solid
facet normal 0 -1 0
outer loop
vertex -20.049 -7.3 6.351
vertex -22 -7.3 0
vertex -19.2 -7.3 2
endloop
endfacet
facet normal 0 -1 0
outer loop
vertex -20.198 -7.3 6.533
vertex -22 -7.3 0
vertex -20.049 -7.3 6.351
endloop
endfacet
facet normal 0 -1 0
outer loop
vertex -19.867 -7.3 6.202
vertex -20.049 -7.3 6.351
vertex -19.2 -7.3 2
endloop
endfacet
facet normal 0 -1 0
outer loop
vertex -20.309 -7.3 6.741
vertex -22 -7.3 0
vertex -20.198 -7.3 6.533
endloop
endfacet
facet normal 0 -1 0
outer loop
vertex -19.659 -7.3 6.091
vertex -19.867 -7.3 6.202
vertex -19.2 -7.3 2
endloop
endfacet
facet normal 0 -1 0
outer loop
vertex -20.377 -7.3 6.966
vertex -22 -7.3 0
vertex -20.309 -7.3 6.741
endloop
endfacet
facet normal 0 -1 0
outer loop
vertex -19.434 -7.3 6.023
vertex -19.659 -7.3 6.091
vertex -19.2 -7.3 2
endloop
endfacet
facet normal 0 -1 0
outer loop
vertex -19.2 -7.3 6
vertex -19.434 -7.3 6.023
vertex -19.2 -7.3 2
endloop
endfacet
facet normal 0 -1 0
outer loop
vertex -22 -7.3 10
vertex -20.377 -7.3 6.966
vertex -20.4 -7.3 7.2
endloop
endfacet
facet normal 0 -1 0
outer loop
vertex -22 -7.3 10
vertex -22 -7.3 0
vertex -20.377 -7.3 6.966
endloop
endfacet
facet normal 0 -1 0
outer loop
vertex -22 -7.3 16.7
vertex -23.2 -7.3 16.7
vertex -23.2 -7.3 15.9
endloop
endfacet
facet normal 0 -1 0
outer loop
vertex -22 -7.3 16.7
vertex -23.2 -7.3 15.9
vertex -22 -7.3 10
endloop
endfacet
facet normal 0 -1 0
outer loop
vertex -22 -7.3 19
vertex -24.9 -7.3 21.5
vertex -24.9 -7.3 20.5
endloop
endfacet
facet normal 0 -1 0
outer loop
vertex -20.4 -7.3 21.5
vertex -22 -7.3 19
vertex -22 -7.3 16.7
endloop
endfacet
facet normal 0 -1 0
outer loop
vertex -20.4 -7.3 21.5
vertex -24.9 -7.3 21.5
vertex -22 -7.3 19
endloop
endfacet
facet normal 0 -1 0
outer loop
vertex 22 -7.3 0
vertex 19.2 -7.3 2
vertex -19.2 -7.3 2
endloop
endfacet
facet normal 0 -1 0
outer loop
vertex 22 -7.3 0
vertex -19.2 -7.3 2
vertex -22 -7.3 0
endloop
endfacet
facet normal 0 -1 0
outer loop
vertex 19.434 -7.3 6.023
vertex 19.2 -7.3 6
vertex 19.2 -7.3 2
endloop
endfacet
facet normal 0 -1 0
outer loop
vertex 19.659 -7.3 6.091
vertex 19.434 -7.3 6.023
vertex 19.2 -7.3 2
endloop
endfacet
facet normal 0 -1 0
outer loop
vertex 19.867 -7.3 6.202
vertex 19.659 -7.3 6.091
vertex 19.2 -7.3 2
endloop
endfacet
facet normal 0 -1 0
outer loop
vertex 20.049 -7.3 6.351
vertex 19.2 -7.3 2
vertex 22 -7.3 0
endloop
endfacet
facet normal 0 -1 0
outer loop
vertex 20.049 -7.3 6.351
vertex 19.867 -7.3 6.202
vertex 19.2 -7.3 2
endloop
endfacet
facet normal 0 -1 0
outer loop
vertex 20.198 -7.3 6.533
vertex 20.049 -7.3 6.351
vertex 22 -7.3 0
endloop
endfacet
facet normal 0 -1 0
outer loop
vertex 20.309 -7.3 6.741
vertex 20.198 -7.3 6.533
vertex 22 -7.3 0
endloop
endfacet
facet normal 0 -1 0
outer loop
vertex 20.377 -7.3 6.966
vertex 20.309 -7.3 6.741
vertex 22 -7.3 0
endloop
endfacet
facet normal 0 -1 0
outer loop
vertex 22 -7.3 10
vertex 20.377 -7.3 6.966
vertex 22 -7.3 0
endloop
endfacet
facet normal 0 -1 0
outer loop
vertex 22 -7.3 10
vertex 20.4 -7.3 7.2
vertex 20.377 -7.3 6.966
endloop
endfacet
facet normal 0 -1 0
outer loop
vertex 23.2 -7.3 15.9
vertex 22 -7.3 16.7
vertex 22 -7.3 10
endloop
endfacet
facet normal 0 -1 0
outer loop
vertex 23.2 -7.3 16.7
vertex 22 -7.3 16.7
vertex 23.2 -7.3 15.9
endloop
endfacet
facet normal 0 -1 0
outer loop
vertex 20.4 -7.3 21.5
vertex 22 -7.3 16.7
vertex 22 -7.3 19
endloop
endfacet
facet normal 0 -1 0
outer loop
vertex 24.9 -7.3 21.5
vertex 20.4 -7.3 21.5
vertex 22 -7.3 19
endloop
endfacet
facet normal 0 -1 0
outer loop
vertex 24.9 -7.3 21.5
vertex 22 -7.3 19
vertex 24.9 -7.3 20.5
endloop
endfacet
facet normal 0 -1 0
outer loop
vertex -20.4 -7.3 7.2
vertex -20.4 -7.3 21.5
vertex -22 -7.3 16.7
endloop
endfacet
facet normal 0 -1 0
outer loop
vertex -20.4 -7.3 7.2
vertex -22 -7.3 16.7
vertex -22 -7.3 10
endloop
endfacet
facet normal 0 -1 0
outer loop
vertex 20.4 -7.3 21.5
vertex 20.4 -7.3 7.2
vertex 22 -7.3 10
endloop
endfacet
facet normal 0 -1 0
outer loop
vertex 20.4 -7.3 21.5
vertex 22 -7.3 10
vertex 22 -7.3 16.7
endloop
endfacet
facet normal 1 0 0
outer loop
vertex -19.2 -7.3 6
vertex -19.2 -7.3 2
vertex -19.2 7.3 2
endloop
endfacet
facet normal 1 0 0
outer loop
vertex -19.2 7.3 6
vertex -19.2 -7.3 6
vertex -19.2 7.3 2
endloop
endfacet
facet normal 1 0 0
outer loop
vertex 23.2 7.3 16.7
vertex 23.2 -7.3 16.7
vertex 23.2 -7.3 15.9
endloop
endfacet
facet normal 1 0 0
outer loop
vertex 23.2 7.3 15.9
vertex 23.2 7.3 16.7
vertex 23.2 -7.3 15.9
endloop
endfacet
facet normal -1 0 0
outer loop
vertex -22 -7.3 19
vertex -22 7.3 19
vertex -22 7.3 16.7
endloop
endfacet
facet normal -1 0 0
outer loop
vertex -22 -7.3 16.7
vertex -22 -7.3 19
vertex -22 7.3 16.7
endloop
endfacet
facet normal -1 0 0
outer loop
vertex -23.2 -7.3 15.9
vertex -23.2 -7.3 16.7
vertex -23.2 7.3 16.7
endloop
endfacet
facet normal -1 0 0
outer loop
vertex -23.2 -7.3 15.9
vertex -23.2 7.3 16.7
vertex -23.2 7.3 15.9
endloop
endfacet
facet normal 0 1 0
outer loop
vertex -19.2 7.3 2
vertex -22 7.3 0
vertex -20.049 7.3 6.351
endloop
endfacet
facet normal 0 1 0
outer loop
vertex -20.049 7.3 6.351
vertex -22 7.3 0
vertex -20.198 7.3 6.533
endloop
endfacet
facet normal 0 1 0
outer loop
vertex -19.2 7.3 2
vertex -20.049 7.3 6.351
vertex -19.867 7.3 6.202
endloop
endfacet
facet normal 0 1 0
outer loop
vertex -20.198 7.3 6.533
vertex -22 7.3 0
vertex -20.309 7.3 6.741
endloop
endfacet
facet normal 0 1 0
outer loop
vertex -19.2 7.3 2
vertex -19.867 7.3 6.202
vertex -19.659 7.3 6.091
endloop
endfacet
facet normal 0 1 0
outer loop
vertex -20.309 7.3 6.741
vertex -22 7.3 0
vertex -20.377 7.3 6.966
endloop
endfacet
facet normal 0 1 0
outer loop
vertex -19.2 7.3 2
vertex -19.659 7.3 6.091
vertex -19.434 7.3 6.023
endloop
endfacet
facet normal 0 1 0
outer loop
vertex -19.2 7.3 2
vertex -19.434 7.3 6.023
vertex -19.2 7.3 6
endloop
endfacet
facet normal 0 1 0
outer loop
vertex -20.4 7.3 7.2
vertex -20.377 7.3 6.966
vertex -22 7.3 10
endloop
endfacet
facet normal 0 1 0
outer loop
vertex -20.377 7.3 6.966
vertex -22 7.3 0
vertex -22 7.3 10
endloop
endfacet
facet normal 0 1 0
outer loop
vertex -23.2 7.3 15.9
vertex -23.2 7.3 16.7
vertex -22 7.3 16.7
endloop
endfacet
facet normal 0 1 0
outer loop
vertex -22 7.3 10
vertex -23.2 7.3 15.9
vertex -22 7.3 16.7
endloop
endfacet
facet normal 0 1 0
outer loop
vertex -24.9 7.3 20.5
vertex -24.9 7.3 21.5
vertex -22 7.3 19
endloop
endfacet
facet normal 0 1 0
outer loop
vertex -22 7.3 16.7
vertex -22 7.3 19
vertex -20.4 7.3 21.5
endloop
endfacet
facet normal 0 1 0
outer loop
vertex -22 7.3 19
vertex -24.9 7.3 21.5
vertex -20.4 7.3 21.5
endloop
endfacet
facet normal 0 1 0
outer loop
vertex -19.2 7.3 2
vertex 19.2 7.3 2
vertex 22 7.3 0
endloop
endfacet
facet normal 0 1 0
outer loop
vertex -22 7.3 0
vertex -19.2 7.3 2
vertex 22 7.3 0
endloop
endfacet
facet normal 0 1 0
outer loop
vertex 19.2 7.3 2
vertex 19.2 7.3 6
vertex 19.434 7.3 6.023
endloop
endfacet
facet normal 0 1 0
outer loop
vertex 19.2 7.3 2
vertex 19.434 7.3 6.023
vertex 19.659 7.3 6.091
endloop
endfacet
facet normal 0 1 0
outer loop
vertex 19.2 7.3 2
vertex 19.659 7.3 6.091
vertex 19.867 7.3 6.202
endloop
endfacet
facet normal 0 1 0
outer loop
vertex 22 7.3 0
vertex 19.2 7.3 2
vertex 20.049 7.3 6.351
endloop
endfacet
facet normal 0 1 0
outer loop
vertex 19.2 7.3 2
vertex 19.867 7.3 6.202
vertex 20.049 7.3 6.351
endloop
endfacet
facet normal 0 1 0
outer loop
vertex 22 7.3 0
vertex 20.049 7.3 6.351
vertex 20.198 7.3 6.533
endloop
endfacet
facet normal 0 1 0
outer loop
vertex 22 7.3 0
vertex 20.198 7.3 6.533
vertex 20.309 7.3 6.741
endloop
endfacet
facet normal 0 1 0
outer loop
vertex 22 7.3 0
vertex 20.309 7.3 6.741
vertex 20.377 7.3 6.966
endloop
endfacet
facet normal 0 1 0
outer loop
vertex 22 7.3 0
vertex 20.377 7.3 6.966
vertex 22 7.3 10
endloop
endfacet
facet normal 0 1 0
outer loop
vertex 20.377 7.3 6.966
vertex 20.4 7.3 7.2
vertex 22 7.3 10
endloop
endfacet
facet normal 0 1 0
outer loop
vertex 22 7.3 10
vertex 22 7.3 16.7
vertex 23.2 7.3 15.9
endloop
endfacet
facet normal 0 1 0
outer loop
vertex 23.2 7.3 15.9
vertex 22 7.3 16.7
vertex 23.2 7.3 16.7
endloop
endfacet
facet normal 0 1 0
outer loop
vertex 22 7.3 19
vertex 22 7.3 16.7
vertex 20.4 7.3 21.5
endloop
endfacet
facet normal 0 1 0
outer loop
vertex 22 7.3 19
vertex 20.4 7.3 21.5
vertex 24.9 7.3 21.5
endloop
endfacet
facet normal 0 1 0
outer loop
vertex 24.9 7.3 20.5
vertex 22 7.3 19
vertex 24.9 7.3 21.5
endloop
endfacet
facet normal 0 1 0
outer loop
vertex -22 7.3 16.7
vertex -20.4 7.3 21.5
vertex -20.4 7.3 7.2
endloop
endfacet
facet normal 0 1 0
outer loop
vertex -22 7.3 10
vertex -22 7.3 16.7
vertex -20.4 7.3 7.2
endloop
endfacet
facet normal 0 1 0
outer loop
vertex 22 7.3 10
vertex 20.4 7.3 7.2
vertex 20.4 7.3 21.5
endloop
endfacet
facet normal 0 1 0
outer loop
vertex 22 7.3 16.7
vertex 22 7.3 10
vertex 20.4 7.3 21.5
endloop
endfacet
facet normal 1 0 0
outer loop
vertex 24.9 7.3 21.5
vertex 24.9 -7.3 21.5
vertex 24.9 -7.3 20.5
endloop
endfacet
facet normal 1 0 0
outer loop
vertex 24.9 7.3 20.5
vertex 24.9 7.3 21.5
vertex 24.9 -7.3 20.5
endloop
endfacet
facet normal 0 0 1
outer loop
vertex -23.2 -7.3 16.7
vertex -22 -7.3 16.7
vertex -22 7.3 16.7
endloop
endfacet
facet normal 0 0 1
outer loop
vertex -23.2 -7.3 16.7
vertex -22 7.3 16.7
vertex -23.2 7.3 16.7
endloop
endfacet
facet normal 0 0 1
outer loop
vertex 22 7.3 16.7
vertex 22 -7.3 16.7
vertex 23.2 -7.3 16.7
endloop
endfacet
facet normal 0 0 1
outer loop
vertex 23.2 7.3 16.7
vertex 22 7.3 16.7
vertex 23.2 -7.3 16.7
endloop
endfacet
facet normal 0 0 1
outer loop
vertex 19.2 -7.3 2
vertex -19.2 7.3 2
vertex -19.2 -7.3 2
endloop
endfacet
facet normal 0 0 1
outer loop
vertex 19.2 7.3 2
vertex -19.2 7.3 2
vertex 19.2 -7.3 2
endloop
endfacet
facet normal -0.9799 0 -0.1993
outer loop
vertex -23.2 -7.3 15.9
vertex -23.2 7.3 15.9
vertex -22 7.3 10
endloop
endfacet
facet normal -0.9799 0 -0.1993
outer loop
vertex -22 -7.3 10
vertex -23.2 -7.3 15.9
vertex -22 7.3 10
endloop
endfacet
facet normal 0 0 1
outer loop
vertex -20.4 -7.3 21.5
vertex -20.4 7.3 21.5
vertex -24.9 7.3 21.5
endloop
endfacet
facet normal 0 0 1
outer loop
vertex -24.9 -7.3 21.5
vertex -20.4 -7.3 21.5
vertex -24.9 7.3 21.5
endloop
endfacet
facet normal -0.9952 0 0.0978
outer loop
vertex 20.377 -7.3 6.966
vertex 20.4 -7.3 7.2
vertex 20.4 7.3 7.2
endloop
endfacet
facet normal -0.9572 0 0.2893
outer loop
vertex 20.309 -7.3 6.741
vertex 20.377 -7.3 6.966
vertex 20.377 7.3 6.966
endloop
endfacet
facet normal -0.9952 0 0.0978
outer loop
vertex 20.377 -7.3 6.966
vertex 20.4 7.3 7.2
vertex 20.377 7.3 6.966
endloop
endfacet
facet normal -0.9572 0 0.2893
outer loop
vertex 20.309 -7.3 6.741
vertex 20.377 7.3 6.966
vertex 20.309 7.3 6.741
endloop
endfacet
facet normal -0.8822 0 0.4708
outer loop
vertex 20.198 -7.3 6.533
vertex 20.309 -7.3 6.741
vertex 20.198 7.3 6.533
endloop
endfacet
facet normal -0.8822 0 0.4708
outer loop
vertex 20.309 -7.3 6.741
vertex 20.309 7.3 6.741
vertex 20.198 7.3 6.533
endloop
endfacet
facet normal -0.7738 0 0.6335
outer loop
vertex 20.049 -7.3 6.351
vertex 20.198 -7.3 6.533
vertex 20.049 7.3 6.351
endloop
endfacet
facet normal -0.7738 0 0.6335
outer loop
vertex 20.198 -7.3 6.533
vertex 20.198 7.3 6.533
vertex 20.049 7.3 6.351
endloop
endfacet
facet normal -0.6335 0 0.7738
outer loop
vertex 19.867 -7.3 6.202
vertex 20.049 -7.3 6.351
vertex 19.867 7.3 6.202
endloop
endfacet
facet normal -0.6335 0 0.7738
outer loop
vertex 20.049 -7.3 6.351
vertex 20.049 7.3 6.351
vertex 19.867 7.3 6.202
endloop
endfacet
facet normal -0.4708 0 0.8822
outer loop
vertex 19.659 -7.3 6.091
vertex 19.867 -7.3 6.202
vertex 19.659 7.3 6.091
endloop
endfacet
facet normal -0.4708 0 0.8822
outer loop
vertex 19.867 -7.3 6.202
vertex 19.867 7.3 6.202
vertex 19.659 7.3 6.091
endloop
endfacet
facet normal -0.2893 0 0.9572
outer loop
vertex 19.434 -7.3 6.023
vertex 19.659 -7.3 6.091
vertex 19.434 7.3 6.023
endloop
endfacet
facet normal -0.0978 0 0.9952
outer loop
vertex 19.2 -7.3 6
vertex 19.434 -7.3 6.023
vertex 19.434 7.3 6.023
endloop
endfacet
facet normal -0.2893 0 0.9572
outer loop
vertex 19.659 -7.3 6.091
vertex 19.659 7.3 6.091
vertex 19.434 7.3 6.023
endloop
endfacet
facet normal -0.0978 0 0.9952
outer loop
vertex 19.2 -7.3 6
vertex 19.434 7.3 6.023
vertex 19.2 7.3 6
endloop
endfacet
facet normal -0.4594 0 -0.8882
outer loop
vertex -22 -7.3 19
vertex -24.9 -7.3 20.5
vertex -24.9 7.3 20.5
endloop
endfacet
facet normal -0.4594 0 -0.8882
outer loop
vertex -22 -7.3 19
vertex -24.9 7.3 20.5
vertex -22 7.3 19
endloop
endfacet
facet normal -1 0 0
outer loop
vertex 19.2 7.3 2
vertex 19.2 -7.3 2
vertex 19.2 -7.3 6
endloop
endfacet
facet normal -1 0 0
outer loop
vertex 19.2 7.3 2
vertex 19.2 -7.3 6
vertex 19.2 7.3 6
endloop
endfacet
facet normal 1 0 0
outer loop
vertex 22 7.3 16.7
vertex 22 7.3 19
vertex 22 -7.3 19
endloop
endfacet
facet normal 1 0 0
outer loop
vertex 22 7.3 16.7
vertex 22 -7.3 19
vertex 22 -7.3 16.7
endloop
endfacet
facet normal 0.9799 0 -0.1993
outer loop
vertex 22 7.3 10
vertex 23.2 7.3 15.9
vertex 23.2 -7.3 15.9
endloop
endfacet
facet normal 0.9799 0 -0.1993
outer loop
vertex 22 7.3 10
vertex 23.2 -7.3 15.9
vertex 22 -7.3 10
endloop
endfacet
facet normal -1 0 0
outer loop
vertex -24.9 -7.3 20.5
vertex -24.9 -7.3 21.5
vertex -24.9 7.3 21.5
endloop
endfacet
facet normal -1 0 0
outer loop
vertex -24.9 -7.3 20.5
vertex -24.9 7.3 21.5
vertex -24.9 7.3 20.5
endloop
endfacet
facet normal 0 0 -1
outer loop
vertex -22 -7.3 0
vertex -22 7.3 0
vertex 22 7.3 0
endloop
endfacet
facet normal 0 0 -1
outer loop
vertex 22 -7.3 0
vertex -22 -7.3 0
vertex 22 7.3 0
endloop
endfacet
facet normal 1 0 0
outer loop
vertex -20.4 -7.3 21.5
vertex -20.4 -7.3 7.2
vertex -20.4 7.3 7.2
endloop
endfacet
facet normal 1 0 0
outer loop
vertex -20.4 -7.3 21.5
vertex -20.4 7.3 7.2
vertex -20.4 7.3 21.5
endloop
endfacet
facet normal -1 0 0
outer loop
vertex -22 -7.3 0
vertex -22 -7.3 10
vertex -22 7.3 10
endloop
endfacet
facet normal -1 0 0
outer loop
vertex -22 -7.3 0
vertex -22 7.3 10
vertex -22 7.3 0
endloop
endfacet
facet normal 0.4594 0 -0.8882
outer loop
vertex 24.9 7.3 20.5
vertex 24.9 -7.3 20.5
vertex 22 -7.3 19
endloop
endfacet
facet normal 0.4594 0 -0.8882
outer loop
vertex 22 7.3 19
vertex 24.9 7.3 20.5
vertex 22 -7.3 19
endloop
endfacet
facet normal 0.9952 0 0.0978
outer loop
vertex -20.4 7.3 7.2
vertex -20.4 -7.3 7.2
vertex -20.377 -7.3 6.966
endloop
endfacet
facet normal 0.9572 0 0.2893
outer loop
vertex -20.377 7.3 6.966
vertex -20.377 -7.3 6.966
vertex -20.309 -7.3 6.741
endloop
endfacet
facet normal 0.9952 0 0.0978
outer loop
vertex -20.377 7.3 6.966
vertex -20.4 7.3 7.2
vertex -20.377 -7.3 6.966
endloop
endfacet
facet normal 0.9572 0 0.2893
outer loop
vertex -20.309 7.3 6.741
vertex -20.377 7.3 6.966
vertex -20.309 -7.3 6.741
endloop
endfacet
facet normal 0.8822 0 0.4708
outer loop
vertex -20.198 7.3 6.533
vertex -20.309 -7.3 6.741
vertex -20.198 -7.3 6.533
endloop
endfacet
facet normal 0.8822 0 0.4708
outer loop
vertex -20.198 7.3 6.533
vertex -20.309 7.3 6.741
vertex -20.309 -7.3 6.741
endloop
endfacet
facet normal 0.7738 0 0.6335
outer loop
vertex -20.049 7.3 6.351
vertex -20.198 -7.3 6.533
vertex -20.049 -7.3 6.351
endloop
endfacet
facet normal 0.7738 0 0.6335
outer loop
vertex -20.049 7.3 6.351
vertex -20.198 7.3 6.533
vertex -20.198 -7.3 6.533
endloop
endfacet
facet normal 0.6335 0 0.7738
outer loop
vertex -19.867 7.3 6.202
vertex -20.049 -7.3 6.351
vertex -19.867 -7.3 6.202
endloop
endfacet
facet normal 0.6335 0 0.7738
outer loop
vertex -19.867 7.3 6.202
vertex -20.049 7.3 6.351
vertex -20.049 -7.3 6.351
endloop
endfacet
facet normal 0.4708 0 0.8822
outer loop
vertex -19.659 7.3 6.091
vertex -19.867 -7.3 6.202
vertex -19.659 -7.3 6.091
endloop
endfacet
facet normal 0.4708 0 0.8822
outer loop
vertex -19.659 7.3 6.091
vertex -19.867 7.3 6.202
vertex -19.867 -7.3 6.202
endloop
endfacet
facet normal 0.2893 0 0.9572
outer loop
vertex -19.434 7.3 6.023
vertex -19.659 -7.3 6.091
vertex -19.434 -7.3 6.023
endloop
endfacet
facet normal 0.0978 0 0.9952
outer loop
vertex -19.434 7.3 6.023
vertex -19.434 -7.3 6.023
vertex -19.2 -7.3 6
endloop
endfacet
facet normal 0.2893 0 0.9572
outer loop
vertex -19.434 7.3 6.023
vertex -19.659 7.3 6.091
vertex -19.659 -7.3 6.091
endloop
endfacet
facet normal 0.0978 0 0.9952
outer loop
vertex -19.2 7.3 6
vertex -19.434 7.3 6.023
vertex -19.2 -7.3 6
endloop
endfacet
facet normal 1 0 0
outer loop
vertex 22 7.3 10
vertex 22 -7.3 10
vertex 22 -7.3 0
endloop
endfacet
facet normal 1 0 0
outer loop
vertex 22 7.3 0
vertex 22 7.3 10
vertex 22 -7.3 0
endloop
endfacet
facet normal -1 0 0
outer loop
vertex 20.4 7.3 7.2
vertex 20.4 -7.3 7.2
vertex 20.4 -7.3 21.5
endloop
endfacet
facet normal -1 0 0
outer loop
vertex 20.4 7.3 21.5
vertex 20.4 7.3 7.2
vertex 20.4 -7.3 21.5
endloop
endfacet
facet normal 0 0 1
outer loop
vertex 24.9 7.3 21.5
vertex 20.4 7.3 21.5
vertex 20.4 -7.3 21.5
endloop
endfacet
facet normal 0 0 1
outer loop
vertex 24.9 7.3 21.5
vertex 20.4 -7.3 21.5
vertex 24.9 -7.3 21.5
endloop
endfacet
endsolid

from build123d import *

# Parameters (mm, degrees)
SKETCH_1_W             = 44
SKETCH_1_H             = 14.6
EXTRUDE_1_DEPTH        = 2
SKETCH_2_W             = 2.8
SKETCH_2_H             = 14.6
EXTRUDE_2_DEPTH        = 4
EXTRUDE_3_DEPTH        = 14.6
FILLET_1_R             = 1.2
FILLET_1_OF_MIRROR_1_R = 1.2


with BuildPart() as part:
    # 草图1 → 凸台-拉伸1 (new body)
    with BuildSketch(Plane.XY):
        Rectangle(SKETCH_1_W, SKETCH_1_H)
    extrude(amount=EXTRUDE_1_DEPTH)

    # 草图2 → 凸台-拉伸2 (add)
    with BuildSketch(Plane.XY.offset(2)):
        with Locations((20.6, 0)):
            Rectangle(SKETCH_2_W, SKETCH_2_H)
    extrude_2 = extrude(amount=EXTRUDE_2_DEPTH)

    # 草图3 → 凸台-拉伸3 (add)
    with BuildSketch(Plane.XZ.offset(7.3)):
        Polygon((22, 6), (20.4, 6), (20.4, 21.5), (24.9, 21.5), (24.9, 20.5), (22, 19), (22, 16.7), (23.2, 16.7), (23.2, 15.9), (22, 10), align=None)
    extrude_3 = extrude(amount=-EXTRUDE_3_DEPTH)

    # 圆角1
    fillet_1_edges = [part.edges().sort_by_distance(p)[0] for p in [
        (20.4, 0, 6),
    ]]
    fillet(fillet_1_edges, radius=FILLET_1_R - 0.0001)  # a hair under: the kernel refuses the full size

    # 镜向1: 凸台-拉伸2, 凸台-拉伸3 across plane
    add(extrude_2.mirror(Plane(origin=(0, 0, 0), x_dir=(0, 0, 1), z_dir=(1, 0, 0))))
    add(extrude_3.mirror(Plane(origin=(0, 0, 0), x_dir=(0, 0, 1), z_dir=(1, 0, 0))))

    # 圆角1 of 镜向1
    fillet_1_of_mirror_1_edges = [part.edges().sort_by_distance(p)[0] for p in [
        (-20.4, 0, 6),
    ]]
    fillet(fillet_1_of_mirror_1_edges, radius=FILLET_1_OF_MIRROR_1_R - 0.0001)  # a hair under: the kernel refuses the full size


solid = part.part
